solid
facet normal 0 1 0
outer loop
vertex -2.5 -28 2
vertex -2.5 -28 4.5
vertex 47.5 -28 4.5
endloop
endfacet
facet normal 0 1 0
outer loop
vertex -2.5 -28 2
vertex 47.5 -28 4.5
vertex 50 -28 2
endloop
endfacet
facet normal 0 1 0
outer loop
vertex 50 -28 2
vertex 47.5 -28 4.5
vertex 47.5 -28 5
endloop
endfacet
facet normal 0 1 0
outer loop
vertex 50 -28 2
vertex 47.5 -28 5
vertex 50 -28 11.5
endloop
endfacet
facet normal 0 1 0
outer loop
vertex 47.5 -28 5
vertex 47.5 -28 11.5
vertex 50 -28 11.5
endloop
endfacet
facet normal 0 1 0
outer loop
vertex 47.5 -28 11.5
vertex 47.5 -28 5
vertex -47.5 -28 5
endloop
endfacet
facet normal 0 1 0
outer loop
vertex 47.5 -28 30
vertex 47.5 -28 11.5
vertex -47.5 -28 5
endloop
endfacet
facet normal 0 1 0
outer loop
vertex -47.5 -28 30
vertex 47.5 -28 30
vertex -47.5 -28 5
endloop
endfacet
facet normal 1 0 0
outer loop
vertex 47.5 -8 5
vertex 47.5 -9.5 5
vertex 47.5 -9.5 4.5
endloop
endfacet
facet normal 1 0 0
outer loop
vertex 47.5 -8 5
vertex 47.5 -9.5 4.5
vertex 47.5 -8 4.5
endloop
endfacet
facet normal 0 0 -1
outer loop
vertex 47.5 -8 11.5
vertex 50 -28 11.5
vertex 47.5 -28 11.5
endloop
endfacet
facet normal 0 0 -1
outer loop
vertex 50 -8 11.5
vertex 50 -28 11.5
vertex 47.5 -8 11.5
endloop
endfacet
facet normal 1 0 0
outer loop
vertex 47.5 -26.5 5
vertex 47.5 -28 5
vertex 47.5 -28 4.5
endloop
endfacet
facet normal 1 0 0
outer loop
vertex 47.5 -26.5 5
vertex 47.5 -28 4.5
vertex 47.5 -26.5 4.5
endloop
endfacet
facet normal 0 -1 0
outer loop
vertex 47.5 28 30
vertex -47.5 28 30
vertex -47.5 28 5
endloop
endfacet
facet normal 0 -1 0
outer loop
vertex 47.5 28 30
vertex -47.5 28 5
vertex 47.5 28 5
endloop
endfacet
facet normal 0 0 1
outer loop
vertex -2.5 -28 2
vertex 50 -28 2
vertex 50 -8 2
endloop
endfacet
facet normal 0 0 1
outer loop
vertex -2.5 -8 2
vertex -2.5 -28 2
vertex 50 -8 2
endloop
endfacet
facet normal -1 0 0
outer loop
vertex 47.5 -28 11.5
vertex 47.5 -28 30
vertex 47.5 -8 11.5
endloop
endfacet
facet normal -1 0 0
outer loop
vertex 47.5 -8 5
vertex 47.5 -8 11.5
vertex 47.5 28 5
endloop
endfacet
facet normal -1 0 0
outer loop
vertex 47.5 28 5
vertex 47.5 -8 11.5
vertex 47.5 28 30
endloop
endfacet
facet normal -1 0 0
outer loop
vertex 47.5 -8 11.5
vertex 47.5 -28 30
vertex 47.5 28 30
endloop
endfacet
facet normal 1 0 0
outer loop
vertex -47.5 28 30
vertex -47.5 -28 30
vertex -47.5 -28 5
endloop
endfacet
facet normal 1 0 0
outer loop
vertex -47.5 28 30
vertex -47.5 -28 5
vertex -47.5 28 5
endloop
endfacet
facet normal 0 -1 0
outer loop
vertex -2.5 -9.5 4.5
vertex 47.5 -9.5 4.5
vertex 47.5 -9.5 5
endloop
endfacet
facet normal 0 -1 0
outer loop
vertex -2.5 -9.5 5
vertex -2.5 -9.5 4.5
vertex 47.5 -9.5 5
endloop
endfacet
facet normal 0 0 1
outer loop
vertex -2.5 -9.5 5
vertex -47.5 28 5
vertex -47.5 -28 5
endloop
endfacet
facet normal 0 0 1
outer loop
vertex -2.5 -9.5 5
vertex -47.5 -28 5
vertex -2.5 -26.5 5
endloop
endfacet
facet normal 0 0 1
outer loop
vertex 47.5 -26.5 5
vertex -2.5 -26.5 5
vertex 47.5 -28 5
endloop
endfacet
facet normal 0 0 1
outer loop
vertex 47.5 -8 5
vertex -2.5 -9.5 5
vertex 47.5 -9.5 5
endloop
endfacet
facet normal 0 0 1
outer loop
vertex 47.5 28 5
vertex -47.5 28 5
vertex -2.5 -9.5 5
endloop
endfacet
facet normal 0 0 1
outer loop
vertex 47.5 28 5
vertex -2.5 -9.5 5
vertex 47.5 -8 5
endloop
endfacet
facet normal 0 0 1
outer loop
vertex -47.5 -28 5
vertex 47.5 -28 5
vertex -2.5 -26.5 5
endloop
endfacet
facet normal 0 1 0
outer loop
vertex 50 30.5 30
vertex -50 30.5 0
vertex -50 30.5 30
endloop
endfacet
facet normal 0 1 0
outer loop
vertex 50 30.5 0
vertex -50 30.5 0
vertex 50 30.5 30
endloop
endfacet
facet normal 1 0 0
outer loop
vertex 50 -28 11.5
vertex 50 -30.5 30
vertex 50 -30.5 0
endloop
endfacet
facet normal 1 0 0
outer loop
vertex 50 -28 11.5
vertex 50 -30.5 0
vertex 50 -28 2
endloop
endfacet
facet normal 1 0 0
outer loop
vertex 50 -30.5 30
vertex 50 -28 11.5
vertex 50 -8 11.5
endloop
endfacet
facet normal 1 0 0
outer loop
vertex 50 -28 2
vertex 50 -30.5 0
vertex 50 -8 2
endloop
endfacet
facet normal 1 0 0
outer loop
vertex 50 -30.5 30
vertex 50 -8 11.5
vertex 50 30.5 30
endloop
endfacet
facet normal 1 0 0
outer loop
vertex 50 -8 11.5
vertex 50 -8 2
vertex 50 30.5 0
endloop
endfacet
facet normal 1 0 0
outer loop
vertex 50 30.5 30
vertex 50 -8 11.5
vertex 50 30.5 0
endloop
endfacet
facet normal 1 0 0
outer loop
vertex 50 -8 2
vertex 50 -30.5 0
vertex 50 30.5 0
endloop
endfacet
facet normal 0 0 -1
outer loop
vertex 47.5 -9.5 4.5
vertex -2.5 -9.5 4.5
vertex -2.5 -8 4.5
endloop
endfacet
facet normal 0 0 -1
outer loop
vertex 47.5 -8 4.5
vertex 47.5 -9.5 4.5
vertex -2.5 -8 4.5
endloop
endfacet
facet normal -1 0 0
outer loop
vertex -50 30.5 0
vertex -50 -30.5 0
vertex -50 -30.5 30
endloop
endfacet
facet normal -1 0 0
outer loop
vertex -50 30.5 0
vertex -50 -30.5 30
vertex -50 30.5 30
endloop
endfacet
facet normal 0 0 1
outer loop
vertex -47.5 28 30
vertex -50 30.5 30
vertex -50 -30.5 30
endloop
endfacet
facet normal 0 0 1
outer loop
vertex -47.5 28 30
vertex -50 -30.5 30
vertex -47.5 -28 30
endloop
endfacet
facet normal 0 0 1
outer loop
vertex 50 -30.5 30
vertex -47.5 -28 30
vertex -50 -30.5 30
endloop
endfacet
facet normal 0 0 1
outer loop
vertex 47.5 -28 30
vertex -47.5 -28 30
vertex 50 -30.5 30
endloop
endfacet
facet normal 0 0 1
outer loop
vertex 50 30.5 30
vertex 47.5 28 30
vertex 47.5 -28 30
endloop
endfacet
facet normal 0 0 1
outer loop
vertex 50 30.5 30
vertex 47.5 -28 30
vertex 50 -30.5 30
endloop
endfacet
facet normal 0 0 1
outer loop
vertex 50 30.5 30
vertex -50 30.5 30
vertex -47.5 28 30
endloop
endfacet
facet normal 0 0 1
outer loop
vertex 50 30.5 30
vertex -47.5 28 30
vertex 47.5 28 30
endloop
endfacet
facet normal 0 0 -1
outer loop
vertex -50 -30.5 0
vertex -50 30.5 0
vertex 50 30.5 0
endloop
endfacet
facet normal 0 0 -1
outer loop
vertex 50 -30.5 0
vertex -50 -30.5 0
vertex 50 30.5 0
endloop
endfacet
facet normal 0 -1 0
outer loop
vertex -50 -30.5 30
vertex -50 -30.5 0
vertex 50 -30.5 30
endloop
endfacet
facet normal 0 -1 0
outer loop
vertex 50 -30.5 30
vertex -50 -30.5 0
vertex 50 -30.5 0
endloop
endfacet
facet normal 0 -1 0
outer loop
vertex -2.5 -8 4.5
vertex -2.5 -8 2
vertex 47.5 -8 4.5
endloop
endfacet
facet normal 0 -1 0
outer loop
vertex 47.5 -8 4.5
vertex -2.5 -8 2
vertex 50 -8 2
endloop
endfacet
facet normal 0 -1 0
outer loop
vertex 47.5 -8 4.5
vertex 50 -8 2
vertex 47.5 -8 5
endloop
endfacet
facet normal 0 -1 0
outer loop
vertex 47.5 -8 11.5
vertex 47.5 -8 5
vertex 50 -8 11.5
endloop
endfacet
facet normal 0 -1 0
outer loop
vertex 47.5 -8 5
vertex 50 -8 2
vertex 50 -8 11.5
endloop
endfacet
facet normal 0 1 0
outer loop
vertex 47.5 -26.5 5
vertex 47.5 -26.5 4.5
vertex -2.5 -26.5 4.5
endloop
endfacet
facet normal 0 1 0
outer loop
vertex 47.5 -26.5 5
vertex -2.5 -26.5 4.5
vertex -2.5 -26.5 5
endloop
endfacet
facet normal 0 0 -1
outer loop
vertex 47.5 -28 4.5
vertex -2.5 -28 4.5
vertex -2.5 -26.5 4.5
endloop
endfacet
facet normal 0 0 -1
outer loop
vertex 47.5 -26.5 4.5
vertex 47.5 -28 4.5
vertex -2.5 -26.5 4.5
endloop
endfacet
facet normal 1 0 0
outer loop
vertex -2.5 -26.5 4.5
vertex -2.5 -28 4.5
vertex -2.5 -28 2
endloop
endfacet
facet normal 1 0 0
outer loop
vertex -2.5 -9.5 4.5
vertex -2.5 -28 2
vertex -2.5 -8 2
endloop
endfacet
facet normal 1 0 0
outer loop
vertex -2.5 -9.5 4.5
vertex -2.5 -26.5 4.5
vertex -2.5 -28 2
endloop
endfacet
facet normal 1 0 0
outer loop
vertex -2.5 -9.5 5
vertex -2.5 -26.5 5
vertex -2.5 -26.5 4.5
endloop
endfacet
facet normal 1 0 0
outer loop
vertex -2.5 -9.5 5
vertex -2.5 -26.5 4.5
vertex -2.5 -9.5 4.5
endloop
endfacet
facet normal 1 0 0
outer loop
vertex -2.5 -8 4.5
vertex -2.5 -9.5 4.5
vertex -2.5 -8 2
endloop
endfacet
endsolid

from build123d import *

# Parameters (mm, degrees)
SKETCH022_W     = 100
SKETCH022_H     = 61
PAD013_DEPTH    = 30
SKETCH023_W     = 95
SKETCH023_H     = 56
POCKET004_DEPTH = 25
SKETCH024_W     = 20
SKETCH024_H     = 9.5
POCKET005_DEPTH = 2.5
SKETCH025_W     = 20
SKETCH025_H     = 2.5
POCKET006_DEPTH = 50
SKETCH026_W     = 17
SKETCH026_H     = 0.5
POCKET007_DEPTH = 50


with BuildPart() as part:
    # Sketch022 → Pad013 (new body)
    with BuildSketch(Plane.XY):
        Rectangle(SKETCH022_W, SKETCH022_H)
    extrude(amount=PAD013_DEPTH)

    # Sketch023 (on Face6 of Pad013) → Pocket004 (cut)
    with BuildSketch(Plane.XY.offset(30)):
        Rectangle(SKETCH023_W, SKETCH023_H)
    extrude(amount=-POCKET004_DEPTH, mode=Mode.SUBTRACT)

    # Sketch024 (on Face3 of Pocket004) → Pocket005 (cut)
    with BuildSketch(Plane.YZ.offset(50)):
        with Locations((-18, 6.75)):
            Rectangle(SKETCH024_W, SKETCH024_H)
    extrude(amount=-POCKET005_DEPTH, mode=Mode.SUBTRACT)

    # Sketch025 (on Face13 of Pocket005) → Pocket006 (cut)
    with BuildSketch(Plane.YZ.offset(47.5)):
        with Locations((-18, 3.25)):
            Rectangle(SKETCH025_W, SKETCH025_H)
    extrude(amount=-POCKET006_DEPTH, mode=Mode.SUBTRACT)

    # Sketch026 (on Face1 of Pocket006) → Pocket007 (cut)
    with BuildSketch(Plane.YZ.offset(47.5)):
        with Locations((-18, 4.75)):
            Rectangle(SKETCH026_W, SKETCH026_H)
    extrude(amount=-POCKET007_DEPTH, mode=Mode.SUBTRACT)


solid = part.part
